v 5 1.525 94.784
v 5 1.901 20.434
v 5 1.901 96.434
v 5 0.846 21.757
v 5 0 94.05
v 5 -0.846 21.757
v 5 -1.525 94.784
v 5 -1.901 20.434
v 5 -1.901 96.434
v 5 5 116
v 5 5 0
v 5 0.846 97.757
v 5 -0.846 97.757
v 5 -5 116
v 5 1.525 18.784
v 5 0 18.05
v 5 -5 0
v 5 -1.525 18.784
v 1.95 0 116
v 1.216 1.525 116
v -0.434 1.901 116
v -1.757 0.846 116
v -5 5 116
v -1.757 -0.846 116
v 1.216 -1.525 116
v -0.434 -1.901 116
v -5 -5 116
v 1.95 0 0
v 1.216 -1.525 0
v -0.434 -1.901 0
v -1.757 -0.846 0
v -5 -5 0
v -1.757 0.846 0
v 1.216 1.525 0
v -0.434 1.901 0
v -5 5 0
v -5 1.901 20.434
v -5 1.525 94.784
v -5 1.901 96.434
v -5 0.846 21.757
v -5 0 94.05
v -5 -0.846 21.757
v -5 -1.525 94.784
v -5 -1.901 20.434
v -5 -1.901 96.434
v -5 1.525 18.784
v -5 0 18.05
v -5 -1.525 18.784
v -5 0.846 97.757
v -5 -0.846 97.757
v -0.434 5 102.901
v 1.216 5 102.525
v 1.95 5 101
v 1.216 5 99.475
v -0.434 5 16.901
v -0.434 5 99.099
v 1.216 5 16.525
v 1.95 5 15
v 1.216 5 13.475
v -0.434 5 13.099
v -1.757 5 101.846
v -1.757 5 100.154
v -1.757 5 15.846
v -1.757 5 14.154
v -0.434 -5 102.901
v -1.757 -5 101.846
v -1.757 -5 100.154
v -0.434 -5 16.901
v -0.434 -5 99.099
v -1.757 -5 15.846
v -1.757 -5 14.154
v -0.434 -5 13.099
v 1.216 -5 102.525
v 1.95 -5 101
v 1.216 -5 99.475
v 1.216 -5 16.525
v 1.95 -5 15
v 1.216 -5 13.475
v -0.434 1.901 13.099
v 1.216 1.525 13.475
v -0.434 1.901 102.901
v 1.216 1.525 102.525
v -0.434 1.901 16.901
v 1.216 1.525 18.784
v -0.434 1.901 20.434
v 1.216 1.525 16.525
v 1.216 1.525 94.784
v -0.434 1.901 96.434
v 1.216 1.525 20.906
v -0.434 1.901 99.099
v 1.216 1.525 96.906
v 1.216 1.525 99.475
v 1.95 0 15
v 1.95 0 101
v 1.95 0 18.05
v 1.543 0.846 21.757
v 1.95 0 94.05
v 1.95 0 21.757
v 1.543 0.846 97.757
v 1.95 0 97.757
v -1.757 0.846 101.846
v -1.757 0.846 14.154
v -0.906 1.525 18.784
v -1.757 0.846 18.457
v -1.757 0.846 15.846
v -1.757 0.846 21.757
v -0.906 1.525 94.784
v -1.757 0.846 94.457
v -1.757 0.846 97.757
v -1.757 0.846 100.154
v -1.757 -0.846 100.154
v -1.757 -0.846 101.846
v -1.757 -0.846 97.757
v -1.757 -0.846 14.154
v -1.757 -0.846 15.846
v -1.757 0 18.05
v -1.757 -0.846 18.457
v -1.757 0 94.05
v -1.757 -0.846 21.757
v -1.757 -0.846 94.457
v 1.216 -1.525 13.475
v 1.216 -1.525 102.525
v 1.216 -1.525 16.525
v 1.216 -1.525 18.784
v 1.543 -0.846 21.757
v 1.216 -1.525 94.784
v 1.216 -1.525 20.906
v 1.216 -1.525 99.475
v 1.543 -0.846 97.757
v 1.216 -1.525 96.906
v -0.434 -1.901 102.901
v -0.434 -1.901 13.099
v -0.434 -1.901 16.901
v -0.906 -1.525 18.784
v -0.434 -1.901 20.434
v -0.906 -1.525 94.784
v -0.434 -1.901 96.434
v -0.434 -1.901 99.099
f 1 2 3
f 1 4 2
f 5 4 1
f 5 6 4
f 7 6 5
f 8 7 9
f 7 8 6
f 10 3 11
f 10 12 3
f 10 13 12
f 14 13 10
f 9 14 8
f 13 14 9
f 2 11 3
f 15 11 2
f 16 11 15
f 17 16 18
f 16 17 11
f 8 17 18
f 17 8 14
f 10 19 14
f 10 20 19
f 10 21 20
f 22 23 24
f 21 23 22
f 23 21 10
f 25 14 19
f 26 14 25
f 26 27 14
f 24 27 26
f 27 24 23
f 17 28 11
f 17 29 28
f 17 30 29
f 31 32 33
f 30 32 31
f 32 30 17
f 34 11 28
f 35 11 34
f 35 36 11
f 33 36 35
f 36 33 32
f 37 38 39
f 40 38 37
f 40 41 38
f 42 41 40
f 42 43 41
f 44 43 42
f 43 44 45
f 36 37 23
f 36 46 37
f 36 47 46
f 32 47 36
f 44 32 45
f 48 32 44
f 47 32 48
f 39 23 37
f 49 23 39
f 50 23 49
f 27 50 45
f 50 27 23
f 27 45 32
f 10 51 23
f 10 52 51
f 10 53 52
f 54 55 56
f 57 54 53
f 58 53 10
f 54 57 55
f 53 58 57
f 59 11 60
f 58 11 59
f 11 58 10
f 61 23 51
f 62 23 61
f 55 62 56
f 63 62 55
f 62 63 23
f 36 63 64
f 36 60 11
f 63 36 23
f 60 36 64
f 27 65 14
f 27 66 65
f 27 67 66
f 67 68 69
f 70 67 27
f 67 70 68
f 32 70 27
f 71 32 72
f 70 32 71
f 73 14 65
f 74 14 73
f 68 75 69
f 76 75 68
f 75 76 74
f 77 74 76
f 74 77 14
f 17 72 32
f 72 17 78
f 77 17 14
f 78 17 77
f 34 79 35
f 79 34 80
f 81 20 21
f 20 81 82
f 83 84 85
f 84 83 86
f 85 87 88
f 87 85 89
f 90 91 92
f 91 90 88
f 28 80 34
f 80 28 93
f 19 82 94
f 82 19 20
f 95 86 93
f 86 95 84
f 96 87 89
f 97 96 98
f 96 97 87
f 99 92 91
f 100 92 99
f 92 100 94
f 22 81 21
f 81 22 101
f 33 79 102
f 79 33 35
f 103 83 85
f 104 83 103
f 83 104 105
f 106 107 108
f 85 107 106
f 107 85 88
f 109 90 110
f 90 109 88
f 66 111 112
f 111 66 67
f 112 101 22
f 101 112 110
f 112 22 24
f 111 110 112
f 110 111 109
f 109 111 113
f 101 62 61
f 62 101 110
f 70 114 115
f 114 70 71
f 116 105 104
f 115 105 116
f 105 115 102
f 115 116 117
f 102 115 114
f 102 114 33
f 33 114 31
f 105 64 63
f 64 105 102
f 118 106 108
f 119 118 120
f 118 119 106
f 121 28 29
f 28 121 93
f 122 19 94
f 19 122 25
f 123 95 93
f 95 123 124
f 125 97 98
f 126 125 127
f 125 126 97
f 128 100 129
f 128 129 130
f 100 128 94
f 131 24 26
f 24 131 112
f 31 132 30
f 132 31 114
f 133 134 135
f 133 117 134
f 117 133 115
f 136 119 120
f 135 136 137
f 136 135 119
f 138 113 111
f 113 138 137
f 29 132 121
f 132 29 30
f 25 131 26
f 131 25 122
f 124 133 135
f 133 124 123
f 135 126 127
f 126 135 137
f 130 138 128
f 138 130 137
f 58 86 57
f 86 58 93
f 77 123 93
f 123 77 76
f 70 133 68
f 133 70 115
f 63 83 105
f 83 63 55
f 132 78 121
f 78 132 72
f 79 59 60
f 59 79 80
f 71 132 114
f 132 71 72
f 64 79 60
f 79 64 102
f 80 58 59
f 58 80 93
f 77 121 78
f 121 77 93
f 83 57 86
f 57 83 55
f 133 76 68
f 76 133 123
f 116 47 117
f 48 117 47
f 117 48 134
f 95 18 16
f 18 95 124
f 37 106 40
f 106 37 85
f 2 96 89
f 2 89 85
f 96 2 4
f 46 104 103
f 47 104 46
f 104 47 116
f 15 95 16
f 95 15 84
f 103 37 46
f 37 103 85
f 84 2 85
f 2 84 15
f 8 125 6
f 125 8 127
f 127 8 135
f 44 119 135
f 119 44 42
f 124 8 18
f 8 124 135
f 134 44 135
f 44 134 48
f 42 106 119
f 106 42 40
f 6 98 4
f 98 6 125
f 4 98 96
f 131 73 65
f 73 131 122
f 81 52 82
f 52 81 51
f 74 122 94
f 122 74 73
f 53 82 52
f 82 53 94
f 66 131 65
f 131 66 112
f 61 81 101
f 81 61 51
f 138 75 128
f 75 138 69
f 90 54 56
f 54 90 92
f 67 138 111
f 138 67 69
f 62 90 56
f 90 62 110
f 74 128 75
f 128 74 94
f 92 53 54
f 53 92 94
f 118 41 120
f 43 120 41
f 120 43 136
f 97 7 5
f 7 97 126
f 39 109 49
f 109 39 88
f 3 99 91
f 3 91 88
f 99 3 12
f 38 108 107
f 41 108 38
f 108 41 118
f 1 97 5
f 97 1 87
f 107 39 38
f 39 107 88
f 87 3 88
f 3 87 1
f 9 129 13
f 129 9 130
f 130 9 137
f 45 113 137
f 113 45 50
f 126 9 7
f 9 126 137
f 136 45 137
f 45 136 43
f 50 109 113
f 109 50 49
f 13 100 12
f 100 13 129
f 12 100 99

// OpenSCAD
// file: CircuitHolder.scad
//$fn=500;

$yOffset=77.5;
$xOffset=75.5;

function getCircuitHolderX() = $xOffset;
function getCircuitHolderY() = $yOffset;

module circuitHole()
{
	difference()
	{
		cylinder(d=8,h=10);
		circuitHoleCenter();
	}
}

module circuitHoleCenter()
{
	translate([0,0,-1]) cylinder(d=5.25,h=11);
}

module circuitHolder()
{
	circuitHole();
	translate([$xOffset,0,0]) circuitHole();
	translate([$xOffset,$yOffset,0]) circuitHole();
	translate([0,$yOffset,0]) circuitHole();
}

module circuitHolderHoles()
{
	circuitHoleCenter();
	translate([$xOffset,0,0]) circuitHoleCenter();
	translate([$xOffset,$yOffset,0]) circuitHoleCenter();
	translate([0,$yOffset,0]) circuitHoleCenter();
}

/*difference()
{
	cube([95,95,0.5]);
	translate([5,5,0]) circuitHolderHoles();
}*/
//translate([5,5,0]) circuitHolder();
// file: PowerHoles.scad
$powerHoleX=151;
$powerHoleY=25;

module powerScrewHole()
{
	translate([0,0,-1]) cylinder(d=4.5,h=10);
}

function getPowerHoleX() = $powerHoleX;
function getPowerHoleY() = $powerHoleY;

module powerHoles()
{
	powerScrewHole();
	translate([0,$powerHoleY,0]) powerScrewHole();
	translate([$powerHoleX,0,0]) powerScrewHole();
	translate([$powerHoleX,$powerHoleY,0]) powerScrewHole();
}

powerHoles();
// file: Bottom.scad
use <PowerHoles.scad>;
use <CircuitHolder.scad>;

$bottomX=241.3;
$bottomY=260.35;
$bottomZ=5;
$wallThickness=3;
$pillerThickness=10;
$connectorLength=20;
$connectorWidth=10;
$holeSize=3.9;
$wallHeight=116;


function getWallThickness() = $wallThickness;
function getHoleSize() = $holeSize;
function getWallHeight() = $wallHeight;
function getPillerThickness() = $pillerThickness;
function getBottomX() = $bottomX;
function getBottomY() = $bottomY;
function getBottomZ() = $bottomZ;

module boltHole()
{
	union()
	{
		cylinder(d=4.5,h=20);
		translate([0,0,$pillerThickness]) cube([$pillerThickness,$pillerThickness,$pillerThickness], center=true);
	}
}

// Bottom cube
module bottomFront()
{
	union()
	{
		difference()
		{
			cube([$bottomX,$bottomY/2,$bottomZ]);
			translate([($pillerThickness/2)+$wallThickness,($pillerThickness/2)+$wallThickness,0]) boltHole();
			translate([($pillerThickness/2)+$wallThickness,($bottomY/2)-($pillerThickness/2),0]) boltHole();
			translate([$bottomX-(($pillerThickness/2)+$wallThickness),($pillerThickness/2)+$wallThickness,0]) boltHole();
			translate([$bottomX-($pillerThickness/2)-$wallThickness,($bottomY/2)-($pillerThickness/2),0]) boltHole();
			translate([($bottomX/2) + (getPowerHoleX()/2*-1),(($bottomY/2)*0.25)+20,0]) powerHoles();
		}
		translate([($bottomX*0.25)-($connectorWidth/2),($bottomY/2)-($connectorLength/2),0]) cube([$connectorWidth, $connectorLength,$bottomZ]);
		translate([($bottomX*0.75)-($connectorWidth/2),($bottomY/2)-($connectorLength/2),0]) cube([$connectorWidth, $connectorLength,$bottomZ]);
	}
}

module bottomBack()
{
	union()
	{
		difference()
		{
			cube([$bottomX,$bottomY/2,$bottomZ]);
			translate([($pillerThickness/2)+$wallThickness,($pillerThickness/2)+$wallThickness,0]) boltHole();
			translate([($pillerThickness/2)+$wallThickness,($bottomY/2)-($pillerThickness/2),0]) boltHole();
			translate([$bottomX-(($pillerThickness/2)+$wallThickness),($pillerThickness/2)+$wallThickness,0]) boltHole();
			translate([$bottomX-($pillerThickness/2)-$wallThickness,($bottomY/2)-($pillerThickness/2),0]) boltHole();
			translate([($bottomX*0.25)-($connectorWidth/2),($bottomY/2)-($connectorLength/2),0]) cube([$connectorWidth, $connectorLength,$bottomZ]);
			translate([($bottomX*0.75)-($connectorWidth/2),($bottomY/2)-($connectorLength/2),0]) cube([$connectorWidth, $connectorLength,$bottomZ]);
			translate([($bottomX*0.5) + (getCircuitHolderX()/2*-1),($bottomY*0.25) + (getCircuitHolderY()/2*-1),0]) circuitHolderHoles();
		}
		translate([($bottomX*0.5) + (getCircuitHolderX()/2*-1),($bottomY*0.25) + (getCircuitHolderY()/2*-1),0]) circuitHolder();
	}
}


bottomBack();
// main file
use <Bottom.scad>;

function zOffset1() = getPillerThickness() * 1.5;
function zOffset2() = getPillerThickness() * 2;

module singlePiller()
{
	difference()
	{
		union()
		{
			translate([0,0,getWallHeight()/2]) cube([getPillerThickness(), getPillerThickness(), getWallHeight()], center=true);
		}

		cylinder(d=getHoleSize(),h=getWallHeight());
		translate([0,getPillerThickness()/2,zOffset1()]) rotate([90,0,0]) cylinder(d=getHoleSize(),h=getPillerThickness());
		translate([getPillerThickness()/2 * -1,0,zOffset2()]) rotate([0,90,0]) cylinder(d=getHoleSize(),h=getPillerThickness());
		translate([0,getPillerThickness()/2,getWallHeight() - zOffset1()]) rotate([90,0,0]) cylinder(d=getHoleSize(),h=getPillerThickness());
		translate([getPillerThickness()/2 * -1,0,getWallHeight() - zOffset2()]) rotate([0,90,0]) cylinder(d=getHoleSize(),h=getPillerThickness());
	}
}

module doublePiller()
{
	union()
	{
		singlePiller();
		translate([getPillerThickness(),0,0]) singlePiller();
	}
}

//doublePiller();
singlePiller();
